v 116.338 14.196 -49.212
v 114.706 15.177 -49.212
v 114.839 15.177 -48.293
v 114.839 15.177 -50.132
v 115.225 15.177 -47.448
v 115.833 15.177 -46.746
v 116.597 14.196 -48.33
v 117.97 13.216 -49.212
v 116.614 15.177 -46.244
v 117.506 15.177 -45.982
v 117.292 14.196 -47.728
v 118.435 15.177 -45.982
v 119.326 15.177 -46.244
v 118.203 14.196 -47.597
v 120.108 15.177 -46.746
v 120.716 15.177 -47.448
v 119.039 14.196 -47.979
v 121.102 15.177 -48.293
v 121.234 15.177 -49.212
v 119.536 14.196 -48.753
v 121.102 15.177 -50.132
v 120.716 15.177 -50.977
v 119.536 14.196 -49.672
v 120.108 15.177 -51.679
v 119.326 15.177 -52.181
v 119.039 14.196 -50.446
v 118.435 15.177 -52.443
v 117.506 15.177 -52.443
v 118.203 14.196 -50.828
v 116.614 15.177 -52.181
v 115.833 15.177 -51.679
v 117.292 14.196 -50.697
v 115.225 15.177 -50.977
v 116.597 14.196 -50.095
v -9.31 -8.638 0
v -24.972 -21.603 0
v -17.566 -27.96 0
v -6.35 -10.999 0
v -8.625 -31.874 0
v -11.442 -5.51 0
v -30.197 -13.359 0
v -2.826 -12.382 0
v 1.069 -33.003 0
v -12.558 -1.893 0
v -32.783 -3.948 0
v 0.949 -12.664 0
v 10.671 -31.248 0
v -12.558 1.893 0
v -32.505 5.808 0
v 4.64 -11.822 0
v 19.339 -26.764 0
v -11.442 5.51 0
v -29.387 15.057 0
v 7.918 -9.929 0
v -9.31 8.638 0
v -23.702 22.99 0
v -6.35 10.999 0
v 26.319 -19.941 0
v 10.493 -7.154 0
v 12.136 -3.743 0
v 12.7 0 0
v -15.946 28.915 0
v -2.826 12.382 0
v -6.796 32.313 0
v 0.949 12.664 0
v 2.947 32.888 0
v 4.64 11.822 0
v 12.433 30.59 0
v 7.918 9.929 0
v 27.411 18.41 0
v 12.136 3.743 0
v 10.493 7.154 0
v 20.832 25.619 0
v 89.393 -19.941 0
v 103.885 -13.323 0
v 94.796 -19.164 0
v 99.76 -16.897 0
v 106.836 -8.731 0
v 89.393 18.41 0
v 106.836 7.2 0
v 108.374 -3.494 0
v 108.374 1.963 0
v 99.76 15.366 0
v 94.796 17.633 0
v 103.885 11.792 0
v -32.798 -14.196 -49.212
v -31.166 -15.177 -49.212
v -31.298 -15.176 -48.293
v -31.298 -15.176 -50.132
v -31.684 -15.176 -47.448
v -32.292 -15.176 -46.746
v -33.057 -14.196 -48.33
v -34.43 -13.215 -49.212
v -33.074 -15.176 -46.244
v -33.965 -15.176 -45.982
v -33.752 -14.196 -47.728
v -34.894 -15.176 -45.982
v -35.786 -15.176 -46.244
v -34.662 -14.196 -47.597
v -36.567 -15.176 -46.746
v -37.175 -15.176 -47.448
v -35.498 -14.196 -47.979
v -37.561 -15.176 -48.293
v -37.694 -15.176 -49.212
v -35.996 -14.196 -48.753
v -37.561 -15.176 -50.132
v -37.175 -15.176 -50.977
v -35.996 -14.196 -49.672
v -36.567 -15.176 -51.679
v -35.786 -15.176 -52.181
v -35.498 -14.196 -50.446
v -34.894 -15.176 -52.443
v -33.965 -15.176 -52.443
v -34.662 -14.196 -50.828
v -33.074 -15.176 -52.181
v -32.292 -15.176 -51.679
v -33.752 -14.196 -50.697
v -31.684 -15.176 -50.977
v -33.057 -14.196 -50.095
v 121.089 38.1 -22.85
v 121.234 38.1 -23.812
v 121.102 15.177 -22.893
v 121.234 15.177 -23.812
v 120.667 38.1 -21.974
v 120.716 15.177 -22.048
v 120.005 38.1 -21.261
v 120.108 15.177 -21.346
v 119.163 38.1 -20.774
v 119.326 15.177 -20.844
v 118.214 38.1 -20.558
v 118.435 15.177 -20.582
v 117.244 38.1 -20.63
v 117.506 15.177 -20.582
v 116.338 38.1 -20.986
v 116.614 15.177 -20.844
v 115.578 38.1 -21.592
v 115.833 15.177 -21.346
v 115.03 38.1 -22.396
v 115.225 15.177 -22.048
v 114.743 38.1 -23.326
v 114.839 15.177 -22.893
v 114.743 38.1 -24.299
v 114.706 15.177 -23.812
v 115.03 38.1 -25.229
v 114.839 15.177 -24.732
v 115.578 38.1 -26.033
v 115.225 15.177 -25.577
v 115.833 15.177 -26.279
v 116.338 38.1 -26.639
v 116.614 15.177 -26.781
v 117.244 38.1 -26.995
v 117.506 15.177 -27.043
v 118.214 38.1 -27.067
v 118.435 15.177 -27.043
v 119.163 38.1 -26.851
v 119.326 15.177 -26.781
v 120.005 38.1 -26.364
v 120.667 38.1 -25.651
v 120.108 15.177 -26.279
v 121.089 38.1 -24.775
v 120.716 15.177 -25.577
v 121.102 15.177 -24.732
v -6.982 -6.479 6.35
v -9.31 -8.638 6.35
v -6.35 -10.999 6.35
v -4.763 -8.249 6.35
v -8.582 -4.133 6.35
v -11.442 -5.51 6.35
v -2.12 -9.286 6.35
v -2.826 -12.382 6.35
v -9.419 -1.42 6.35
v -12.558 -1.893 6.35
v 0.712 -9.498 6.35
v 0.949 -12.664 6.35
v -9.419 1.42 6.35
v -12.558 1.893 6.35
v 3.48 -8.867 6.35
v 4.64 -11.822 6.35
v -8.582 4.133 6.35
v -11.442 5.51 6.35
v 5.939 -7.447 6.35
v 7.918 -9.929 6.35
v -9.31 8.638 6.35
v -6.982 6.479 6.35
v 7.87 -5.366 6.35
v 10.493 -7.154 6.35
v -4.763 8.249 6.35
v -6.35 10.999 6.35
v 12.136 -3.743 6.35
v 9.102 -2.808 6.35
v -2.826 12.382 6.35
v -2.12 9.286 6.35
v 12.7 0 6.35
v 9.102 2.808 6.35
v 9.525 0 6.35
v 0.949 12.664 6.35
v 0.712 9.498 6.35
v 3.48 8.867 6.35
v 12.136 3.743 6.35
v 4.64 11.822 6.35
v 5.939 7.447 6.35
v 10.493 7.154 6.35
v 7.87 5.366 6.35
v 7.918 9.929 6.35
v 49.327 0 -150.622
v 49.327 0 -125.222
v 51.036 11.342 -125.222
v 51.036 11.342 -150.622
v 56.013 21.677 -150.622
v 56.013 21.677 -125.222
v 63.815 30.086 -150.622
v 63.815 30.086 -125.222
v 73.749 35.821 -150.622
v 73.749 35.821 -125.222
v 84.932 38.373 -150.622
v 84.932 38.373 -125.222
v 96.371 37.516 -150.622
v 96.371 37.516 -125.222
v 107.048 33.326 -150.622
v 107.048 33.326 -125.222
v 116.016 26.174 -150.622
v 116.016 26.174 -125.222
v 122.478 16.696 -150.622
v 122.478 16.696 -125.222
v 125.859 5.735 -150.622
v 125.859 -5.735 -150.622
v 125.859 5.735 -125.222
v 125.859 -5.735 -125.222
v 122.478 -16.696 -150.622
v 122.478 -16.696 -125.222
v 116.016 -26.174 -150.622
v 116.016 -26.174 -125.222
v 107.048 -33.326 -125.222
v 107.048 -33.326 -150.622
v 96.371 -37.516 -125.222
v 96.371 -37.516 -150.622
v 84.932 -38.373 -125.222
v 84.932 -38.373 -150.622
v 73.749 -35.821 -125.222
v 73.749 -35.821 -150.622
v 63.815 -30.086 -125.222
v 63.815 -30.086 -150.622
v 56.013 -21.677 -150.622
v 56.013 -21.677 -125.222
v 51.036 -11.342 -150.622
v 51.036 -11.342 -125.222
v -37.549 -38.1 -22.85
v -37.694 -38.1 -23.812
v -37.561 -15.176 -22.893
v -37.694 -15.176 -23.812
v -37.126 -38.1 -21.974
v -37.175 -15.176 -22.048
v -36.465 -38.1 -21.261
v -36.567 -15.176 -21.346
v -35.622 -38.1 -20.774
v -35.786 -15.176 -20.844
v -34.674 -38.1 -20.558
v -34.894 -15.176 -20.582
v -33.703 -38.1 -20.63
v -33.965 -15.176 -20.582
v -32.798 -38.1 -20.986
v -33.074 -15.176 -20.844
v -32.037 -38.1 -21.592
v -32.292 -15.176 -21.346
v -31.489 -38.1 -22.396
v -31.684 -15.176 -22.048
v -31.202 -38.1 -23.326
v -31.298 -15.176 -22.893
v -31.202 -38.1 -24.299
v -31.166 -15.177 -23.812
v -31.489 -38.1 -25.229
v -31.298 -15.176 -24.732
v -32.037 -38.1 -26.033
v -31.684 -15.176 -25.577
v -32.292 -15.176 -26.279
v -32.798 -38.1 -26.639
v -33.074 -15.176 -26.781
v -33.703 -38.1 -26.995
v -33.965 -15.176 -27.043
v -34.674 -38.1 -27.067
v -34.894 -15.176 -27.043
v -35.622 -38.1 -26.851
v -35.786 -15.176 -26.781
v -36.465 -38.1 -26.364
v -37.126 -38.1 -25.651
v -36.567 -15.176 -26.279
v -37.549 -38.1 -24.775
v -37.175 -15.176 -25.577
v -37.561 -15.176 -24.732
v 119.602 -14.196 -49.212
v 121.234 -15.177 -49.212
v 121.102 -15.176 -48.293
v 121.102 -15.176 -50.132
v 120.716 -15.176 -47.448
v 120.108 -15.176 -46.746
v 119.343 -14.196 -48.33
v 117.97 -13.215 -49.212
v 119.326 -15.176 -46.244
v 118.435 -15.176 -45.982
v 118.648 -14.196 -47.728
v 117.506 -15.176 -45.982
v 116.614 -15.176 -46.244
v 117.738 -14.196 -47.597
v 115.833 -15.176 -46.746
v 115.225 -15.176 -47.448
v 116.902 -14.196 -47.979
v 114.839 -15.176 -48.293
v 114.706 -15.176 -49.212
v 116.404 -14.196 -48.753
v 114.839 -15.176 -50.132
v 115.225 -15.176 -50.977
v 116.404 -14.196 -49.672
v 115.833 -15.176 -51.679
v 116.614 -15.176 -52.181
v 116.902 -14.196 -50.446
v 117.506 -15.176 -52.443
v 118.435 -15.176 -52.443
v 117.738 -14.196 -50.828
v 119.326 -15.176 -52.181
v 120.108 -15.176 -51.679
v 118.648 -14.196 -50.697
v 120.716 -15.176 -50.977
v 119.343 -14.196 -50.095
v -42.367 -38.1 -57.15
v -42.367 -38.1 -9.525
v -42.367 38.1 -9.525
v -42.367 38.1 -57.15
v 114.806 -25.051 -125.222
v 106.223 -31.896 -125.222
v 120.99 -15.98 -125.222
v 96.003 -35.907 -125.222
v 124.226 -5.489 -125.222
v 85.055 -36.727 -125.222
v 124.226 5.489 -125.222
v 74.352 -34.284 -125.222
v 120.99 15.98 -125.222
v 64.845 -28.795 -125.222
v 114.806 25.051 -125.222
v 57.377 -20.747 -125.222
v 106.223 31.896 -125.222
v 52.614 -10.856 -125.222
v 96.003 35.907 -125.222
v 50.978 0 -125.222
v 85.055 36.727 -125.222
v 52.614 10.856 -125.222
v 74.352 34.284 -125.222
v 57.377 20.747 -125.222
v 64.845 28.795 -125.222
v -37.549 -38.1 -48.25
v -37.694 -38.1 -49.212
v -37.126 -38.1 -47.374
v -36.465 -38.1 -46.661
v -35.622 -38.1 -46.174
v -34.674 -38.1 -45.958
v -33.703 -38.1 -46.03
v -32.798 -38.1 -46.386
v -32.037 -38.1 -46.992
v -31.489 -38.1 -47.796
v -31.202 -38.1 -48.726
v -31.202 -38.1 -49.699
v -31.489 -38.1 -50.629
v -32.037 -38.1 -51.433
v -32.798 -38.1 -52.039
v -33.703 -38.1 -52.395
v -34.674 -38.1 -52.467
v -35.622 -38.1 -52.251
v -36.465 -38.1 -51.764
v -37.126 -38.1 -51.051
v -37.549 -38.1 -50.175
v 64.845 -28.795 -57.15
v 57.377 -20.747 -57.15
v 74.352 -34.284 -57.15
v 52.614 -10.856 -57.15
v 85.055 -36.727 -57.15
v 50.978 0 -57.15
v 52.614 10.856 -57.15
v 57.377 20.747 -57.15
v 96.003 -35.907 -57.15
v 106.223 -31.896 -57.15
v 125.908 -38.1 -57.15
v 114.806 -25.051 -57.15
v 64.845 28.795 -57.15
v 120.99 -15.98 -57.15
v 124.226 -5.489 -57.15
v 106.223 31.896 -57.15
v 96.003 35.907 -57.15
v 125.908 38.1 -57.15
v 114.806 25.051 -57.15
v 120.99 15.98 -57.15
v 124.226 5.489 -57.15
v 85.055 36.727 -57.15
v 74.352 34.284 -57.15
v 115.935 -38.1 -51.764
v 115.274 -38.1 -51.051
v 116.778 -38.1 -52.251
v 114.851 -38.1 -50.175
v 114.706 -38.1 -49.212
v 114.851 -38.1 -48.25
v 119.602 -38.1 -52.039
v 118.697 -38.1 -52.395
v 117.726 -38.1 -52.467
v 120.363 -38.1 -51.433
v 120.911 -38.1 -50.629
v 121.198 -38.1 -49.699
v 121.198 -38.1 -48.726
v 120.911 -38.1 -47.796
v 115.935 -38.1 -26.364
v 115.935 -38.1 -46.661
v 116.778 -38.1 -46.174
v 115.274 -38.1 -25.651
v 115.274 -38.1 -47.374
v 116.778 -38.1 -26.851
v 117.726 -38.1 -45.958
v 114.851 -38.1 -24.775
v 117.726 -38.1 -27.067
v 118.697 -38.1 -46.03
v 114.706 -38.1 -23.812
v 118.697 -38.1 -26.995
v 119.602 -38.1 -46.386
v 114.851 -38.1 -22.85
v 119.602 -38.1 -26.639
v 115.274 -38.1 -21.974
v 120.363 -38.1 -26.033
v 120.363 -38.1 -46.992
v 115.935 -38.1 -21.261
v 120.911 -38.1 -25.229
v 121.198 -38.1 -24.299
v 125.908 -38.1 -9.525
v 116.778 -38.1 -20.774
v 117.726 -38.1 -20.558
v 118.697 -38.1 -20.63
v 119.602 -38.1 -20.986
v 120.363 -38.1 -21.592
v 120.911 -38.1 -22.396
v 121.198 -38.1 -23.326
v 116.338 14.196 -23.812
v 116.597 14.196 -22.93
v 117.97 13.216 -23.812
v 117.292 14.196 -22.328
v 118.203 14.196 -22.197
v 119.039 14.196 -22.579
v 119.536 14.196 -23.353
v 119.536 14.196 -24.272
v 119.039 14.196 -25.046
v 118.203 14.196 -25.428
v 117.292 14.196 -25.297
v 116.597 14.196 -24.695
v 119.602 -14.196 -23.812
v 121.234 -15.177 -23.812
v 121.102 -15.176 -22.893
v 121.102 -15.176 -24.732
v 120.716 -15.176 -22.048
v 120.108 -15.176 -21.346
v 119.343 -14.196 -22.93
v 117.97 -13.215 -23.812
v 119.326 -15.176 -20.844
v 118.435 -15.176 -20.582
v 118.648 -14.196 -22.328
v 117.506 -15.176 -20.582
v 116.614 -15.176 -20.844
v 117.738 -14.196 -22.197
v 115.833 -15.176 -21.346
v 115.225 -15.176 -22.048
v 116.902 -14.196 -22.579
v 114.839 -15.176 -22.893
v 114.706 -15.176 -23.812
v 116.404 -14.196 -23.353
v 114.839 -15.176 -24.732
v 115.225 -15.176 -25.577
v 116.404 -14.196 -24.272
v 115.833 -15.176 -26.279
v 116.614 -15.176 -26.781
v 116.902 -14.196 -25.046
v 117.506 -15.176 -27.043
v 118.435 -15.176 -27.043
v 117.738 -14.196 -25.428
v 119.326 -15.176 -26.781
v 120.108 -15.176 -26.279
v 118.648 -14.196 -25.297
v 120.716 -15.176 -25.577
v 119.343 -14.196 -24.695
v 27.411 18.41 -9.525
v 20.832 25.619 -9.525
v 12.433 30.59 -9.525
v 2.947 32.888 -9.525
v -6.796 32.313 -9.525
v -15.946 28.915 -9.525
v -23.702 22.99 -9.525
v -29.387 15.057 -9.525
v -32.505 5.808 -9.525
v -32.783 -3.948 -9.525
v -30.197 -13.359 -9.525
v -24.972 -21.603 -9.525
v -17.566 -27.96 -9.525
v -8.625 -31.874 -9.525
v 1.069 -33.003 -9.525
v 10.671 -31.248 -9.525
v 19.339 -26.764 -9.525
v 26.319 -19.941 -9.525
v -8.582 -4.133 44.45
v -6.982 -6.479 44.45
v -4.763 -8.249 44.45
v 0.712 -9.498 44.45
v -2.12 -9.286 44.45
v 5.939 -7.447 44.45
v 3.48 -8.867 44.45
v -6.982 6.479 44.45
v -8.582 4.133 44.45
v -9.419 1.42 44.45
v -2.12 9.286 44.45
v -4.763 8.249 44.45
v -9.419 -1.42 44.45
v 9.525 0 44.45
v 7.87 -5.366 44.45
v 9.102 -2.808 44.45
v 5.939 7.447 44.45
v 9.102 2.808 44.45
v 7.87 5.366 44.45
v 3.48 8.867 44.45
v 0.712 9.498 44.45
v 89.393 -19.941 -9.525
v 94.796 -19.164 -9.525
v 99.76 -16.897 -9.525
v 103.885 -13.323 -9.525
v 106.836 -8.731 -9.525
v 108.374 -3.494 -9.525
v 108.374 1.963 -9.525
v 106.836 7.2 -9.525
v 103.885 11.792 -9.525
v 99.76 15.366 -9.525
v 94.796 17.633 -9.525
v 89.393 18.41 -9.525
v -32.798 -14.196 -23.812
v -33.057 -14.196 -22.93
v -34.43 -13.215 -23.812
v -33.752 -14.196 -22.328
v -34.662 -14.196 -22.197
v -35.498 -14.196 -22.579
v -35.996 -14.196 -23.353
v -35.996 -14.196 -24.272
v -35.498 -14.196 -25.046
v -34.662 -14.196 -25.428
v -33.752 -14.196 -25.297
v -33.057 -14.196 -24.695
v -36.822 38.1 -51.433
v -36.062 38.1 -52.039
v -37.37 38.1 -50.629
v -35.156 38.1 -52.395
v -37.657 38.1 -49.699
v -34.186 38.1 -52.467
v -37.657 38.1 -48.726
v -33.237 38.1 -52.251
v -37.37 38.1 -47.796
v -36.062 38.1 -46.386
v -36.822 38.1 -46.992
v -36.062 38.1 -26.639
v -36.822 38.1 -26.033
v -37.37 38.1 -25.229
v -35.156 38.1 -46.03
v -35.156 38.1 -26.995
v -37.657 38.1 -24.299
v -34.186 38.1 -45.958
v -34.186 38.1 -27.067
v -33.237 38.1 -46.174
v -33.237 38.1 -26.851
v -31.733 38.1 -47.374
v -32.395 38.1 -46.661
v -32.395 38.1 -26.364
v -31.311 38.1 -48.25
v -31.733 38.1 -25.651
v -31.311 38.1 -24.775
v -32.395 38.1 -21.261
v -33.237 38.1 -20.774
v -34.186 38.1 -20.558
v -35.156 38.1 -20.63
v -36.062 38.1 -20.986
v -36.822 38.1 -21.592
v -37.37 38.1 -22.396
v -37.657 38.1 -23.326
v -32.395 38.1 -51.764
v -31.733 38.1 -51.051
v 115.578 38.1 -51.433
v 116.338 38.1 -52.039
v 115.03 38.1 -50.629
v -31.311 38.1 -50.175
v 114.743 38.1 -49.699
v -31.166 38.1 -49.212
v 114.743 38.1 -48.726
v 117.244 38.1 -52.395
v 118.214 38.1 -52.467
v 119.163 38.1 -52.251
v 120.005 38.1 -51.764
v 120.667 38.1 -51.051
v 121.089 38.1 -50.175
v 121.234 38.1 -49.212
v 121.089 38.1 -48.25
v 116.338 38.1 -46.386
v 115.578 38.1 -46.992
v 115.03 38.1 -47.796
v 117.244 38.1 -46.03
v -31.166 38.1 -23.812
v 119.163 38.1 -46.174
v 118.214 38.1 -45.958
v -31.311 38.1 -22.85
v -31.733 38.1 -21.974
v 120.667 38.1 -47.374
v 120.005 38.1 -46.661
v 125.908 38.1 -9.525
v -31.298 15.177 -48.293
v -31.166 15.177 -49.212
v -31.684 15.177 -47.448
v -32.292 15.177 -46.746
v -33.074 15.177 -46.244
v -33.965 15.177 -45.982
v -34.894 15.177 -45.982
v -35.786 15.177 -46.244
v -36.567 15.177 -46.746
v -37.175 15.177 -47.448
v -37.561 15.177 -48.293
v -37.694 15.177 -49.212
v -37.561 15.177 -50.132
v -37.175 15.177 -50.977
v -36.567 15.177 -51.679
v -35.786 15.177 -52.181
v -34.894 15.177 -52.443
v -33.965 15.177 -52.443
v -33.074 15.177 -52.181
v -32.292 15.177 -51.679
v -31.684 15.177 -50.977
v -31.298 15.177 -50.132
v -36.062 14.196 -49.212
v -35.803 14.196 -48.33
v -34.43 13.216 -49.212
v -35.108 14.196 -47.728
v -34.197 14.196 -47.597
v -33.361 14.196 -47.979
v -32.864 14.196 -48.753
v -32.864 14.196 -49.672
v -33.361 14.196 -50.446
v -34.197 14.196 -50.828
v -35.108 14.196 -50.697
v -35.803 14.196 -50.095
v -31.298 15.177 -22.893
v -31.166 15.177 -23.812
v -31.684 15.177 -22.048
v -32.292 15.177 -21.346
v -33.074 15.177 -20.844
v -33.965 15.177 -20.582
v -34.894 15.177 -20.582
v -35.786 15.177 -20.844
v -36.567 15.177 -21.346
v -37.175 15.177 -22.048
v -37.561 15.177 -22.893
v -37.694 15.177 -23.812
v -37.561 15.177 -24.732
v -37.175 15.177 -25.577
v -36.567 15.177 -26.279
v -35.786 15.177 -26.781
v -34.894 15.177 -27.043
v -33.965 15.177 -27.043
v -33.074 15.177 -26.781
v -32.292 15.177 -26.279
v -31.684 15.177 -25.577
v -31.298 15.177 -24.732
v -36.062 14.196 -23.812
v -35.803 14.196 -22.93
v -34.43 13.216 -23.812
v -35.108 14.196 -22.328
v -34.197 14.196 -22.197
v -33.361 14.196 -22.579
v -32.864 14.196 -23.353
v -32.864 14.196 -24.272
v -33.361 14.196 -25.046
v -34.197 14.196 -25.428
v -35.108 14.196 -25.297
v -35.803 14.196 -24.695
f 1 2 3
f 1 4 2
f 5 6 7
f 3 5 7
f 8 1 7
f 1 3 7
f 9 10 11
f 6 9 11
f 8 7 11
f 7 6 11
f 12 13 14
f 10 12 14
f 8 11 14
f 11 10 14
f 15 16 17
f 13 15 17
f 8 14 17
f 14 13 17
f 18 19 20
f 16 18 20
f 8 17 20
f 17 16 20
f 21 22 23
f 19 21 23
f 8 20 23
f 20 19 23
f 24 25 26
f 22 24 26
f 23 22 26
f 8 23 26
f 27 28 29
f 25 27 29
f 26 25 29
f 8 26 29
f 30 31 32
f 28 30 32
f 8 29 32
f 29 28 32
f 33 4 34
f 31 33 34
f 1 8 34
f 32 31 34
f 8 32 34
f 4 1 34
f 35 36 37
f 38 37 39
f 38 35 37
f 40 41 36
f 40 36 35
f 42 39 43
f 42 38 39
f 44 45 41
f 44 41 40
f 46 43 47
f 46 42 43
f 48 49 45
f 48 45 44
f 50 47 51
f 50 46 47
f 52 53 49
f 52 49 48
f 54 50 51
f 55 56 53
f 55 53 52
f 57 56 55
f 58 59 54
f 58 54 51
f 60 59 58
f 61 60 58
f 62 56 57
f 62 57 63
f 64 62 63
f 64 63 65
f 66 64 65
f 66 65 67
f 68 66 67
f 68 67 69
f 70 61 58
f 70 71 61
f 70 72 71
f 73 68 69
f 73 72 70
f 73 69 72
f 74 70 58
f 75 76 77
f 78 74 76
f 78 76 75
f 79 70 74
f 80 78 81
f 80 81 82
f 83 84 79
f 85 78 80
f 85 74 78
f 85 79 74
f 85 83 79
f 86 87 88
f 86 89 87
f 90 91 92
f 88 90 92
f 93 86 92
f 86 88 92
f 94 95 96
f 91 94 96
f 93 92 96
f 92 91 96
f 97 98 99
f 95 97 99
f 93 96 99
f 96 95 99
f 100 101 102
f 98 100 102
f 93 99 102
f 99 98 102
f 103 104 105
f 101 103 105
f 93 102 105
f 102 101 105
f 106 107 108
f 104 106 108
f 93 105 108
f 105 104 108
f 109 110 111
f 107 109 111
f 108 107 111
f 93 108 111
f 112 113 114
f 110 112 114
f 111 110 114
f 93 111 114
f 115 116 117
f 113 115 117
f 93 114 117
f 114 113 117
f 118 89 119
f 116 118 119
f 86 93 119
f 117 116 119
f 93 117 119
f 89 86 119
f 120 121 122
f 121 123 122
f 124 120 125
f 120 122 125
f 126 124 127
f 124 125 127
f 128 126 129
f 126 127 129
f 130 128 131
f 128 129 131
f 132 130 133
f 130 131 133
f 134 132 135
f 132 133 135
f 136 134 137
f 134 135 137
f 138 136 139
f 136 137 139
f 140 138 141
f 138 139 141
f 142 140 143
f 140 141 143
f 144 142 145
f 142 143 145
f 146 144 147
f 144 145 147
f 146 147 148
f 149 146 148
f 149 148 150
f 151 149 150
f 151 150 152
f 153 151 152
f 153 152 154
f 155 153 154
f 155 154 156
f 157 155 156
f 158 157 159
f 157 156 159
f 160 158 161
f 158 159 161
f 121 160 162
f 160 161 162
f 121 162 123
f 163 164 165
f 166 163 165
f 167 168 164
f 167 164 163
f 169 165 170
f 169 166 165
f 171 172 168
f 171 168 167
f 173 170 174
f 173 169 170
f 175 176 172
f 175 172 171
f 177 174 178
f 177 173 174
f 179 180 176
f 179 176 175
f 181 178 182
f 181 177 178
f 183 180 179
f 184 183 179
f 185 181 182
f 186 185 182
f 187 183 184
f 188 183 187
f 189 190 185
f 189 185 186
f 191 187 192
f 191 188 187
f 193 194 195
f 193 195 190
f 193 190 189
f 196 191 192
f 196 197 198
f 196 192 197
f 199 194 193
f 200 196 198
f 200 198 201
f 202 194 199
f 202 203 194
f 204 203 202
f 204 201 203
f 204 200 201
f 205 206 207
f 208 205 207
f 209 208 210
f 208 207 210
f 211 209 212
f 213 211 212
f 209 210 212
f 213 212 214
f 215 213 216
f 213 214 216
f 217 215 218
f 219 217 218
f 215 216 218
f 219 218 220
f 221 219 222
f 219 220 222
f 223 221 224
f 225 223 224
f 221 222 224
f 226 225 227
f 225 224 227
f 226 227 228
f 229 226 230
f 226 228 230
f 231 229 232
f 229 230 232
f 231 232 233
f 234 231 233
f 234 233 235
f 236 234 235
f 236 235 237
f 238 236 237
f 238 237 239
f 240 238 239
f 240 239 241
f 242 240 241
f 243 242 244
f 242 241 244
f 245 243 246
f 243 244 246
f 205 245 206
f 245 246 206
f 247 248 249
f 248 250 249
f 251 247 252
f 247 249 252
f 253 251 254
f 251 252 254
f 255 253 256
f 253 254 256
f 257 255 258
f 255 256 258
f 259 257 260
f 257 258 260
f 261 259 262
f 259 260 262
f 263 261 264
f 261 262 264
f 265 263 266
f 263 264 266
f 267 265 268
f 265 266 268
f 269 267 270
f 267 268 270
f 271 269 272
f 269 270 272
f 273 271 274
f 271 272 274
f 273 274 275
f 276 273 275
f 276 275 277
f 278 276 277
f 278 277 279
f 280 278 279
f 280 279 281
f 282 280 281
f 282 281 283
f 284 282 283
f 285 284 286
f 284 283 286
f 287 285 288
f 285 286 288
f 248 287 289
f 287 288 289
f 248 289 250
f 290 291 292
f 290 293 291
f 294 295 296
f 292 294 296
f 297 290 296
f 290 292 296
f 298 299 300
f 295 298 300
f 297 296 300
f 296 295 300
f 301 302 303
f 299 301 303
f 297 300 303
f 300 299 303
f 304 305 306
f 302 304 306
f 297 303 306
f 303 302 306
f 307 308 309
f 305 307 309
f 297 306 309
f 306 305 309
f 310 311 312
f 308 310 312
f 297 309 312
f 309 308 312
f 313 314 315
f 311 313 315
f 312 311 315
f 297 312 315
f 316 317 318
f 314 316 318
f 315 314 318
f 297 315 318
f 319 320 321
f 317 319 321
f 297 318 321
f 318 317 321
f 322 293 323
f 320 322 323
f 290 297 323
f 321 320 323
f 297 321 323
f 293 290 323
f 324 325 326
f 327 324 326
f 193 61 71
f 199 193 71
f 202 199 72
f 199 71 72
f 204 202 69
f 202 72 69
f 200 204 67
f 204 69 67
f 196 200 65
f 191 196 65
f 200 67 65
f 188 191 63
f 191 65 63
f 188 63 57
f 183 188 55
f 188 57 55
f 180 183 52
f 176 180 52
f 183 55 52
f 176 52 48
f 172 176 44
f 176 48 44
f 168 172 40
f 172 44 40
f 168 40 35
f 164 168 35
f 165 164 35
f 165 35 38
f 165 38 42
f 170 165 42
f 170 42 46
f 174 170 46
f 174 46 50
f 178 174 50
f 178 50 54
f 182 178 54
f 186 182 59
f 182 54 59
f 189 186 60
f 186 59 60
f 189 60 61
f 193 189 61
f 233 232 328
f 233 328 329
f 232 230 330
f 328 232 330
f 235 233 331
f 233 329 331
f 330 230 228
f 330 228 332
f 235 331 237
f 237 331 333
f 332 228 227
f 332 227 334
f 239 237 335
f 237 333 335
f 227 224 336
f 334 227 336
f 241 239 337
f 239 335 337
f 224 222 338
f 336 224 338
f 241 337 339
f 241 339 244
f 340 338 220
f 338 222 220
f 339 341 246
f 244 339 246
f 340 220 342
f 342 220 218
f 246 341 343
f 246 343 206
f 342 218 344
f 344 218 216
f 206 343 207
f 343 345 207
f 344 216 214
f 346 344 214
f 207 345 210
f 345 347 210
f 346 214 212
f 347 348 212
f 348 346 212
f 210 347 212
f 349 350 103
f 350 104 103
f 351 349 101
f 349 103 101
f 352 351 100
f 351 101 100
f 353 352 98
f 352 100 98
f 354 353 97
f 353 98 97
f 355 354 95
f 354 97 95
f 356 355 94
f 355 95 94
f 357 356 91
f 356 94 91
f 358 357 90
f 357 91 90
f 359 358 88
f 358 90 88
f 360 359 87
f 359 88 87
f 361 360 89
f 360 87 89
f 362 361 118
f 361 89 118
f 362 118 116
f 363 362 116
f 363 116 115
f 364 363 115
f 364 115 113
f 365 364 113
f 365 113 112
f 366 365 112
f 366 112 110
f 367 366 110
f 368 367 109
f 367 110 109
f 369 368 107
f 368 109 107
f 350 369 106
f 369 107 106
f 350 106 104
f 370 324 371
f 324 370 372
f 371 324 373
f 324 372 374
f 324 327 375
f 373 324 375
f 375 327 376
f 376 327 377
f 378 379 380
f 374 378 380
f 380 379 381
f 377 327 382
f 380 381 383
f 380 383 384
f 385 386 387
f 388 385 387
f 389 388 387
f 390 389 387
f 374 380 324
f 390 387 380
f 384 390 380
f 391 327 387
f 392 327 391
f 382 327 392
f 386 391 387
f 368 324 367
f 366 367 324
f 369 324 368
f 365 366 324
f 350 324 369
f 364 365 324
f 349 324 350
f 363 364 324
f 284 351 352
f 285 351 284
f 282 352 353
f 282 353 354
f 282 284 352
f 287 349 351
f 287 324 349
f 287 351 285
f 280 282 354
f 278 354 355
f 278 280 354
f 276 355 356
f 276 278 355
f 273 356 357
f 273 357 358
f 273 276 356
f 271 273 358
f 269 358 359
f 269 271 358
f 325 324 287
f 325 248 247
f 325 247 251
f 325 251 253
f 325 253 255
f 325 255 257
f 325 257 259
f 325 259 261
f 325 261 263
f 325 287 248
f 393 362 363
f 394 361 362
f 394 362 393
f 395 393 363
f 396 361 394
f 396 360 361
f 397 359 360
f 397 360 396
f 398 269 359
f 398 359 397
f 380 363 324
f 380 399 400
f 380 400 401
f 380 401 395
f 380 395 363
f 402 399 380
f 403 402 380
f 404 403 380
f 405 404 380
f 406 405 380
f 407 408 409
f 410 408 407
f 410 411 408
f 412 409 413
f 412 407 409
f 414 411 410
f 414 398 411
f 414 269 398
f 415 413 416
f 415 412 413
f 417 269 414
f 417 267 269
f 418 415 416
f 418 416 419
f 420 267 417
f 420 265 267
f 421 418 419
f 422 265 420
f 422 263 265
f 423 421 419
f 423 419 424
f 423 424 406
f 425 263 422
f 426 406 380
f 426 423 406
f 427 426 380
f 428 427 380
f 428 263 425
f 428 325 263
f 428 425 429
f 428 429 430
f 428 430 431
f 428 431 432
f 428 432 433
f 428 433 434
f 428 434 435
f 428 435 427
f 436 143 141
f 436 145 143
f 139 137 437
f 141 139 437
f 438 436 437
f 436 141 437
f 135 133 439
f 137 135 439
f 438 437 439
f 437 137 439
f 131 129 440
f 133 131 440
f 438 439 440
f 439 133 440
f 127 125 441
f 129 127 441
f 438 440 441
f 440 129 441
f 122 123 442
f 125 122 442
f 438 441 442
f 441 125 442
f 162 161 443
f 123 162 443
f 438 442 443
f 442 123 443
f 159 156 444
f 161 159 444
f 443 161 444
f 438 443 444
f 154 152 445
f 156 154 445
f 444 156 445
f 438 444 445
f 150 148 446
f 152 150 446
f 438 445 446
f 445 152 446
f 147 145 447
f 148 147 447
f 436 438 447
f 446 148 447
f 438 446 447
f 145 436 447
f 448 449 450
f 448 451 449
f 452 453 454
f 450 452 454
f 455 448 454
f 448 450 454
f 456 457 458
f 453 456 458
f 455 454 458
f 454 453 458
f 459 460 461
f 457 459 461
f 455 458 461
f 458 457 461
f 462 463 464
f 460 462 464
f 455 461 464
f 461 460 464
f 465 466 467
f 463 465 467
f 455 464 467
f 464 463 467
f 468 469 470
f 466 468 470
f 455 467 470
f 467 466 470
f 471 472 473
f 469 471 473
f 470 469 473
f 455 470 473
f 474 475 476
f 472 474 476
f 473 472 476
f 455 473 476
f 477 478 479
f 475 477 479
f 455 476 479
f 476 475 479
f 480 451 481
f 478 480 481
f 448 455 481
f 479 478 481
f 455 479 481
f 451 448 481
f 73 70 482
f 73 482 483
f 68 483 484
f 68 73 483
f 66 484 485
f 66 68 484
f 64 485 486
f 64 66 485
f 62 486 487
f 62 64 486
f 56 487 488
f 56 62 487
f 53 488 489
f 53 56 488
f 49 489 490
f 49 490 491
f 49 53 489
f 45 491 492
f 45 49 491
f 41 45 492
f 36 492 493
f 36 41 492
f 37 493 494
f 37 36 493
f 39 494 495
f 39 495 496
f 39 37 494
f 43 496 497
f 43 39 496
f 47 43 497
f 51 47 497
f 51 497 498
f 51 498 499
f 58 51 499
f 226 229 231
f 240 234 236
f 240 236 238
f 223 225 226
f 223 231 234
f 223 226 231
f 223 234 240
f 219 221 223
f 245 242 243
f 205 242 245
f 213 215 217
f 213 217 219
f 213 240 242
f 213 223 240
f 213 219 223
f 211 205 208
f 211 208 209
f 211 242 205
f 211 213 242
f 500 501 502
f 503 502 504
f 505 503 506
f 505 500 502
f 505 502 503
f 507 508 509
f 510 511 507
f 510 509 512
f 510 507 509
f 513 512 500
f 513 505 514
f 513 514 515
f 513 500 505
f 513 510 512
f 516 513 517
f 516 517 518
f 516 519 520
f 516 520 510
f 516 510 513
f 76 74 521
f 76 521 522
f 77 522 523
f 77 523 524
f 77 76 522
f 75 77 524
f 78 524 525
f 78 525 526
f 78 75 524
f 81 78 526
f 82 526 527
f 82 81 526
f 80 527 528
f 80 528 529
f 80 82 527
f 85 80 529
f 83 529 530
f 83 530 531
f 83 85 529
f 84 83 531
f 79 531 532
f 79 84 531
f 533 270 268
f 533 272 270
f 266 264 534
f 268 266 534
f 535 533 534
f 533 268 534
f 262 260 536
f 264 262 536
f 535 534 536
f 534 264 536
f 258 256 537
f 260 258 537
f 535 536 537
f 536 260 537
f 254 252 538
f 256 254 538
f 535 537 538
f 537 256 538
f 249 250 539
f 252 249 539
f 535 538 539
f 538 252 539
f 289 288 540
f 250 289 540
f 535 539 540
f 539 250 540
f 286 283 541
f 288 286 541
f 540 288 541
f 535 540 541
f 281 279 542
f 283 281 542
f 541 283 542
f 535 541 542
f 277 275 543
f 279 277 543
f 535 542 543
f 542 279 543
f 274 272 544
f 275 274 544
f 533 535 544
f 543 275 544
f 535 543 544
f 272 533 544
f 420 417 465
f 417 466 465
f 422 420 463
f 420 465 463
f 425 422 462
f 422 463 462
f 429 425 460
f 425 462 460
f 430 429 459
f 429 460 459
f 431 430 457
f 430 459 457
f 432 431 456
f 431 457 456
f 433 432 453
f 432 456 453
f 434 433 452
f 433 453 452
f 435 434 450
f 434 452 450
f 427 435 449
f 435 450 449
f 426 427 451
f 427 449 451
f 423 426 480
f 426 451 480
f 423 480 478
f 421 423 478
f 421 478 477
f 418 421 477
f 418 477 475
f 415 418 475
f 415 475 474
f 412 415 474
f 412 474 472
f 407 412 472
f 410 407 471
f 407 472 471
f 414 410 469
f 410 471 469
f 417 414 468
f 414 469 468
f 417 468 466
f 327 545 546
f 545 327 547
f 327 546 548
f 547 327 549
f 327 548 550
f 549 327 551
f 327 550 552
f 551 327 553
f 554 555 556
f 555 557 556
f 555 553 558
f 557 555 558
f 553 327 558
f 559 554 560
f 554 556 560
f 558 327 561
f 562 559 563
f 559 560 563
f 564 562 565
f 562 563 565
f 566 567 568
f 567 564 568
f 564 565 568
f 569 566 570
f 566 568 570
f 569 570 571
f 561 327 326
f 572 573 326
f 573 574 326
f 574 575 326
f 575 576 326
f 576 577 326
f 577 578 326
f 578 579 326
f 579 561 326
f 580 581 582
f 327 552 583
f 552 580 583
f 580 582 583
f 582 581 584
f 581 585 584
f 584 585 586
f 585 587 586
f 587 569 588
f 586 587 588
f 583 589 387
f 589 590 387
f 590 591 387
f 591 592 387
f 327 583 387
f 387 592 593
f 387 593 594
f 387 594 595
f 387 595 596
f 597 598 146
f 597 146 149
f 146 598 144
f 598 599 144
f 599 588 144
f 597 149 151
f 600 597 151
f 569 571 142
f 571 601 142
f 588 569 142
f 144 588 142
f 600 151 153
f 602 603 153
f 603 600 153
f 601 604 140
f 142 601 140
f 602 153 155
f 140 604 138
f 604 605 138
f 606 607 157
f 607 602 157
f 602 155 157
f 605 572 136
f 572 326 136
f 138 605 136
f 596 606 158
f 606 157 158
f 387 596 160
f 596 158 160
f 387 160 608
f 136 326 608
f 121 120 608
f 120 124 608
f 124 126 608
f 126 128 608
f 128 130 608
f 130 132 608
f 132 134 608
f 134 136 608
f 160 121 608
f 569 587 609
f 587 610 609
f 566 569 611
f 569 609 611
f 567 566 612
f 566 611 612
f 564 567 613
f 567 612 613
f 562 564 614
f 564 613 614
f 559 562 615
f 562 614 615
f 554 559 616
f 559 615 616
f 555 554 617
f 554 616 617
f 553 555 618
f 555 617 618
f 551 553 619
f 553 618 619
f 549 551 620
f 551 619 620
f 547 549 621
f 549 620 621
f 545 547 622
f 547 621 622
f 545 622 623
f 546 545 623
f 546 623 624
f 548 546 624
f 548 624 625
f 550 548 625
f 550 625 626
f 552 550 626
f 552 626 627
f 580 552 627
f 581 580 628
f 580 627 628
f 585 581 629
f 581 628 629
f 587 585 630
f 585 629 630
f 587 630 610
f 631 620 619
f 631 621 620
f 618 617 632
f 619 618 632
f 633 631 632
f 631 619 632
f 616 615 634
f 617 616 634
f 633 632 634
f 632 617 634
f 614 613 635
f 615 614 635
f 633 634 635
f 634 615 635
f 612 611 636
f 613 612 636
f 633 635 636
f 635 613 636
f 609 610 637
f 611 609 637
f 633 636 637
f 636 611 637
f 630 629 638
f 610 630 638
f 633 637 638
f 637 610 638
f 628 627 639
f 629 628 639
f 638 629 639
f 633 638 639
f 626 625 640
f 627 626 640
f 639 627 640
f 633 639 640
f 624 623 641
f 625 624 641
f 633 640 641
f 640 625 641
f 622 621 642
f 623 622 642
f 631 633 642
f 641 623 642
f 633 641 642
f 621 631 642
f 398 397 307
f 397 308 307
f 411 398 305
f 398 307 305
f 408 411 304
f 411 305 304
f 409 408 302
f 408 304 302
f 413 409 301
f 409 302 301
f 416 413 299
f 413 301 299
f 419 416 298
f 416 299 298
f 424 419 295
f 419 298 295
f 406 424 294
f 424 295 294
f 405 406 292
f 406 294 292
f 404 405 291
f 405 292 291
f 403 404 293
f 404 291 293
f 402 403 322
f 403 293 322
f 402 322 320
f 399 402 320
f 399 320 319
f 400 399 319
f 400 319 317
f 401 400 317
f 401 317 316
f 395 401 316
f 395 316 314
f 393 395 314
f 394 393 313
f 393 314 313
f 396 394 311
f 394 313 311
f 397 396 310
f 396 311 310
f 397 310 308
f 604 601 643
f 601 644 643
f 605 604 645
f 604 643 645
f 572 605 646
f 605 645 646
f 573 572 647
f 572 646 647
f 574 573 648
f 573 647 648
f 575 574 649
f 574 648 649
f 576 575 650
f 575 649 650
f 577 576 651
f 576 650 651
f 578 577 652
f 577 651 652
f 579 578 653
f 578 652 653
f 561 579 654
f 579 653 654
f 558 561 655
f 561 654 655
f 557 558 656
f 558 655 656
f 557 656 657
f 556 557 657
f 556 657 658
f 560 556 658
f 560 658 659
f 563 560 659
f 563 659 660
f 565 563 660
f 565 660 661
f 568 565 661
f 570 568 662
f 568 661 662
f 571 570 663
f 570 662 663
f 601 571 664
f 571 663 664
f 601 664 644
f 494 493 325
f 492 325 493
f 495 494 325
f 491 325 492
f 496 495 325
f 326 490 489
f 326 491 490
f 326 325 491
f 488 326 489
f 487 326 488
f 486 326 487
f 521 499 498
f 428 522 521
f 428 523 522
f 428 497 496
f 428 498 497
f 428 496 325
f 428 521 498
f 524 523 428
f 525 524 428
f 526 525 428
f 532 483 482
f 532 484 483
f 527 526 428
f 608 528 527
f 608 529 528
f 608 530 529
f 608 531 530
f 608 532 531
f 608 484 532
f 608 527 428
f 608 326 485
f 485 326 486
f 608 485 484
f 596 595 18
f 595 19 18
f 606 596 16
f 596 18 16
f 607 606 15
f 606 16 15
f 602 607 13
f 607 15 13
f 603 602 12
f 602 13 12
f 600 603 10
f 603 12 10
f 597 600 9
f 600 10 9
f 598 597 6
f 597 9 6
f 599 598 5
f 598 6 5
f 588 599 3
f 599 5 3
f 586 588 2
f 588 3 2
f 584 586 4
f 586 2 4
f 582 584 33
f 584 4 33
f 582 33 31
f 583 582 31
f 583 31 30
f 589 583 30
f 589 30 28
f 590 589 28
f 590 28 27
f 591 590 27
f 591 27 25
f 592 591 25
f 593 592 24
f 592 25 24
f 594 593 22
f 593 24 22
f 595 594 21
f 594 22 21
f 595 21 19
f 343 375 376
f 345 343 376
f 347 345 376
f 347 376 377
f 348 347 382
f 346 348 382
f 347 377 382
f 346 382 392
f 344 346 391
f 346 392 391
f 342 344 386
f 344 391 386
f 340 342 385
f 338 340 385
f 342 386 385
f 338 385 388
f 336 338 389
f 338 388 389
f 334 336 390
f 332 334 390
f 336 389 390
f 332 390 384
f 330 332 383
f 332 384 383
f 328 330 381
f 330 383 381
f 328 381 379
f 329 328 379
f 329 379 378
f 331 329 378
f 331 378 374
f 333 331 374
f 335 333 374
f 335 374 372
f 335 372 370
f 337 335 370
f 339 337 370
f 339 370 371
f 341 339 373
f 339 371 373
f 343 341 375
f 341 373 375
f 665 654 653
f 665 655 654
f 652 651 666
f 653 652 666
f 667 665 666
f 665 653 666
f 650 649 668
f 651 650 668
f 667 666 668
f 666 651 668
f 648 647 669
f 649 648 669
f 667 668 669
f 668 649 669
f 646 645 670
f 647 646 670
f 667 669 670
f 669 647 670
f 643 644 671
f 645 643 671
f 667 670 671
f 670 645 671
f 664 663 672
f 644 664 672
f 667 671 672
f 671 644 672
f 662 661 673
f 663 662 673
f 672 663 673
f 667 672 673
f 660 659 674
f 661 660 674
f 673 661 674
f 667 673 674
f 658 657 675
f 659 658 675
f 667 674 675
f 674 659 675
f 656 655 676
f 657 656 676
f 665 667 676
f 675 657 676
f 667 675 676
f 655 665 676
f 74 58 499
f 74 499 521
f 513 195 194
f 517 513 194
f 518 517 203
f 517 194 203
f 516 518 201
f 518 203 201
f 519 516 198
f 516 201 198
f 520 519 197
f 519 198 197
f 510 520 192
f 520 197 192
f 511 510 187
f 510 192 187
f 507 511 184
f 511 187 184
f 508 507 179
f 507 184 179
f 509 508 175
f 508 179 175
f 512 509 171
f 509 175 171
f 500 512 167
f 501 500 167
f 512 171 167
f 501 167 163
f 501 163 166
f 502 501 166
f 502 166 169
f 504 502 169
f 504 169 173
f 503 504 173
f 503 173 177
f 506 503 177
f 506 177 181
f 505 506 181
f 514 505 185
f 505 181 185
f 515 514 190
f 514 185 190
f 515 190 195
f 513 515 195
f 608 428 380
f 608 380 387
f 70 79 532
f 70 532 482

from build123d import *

# Parameters (mm, degrees)
SKETCH1_W                    = 168.275
SKETCH1_H                    = 76.2
EXTRUDE1_DEPTH               = 57.15
SKETCH2_R                    = 12.7
EXTRUDE2_DEPTH               = 6.35
SKETCH3_R                    = 9.525
EXTRUDE3_DEPTH               = 38.1
F_5_16_18_TAPPED_HOLE1_D     = 6.5278
F_5_16_18_TAPPED_HOLE1_DEPTH = 22.9235
F_5_16_18_TAPPED_HOLE1_TIP   = 1.961148974
SKETCH7_R                    = 36.83
EXTRUDE4_DEPTH               = 68.072
SKETCH8_R                    = 38.481
EXTRUDE5_DEPTH               = 25.4
F_5_16_18_TAPPED_HOLE2_D     = 6.5278
F_5_16_18_TAPPED_HOLE2_DEPTH = 22.922992
F_5_16_18_TAPPED_HOLE2_TIP   = 1.961148974
SKETCH11_OUTSIDE_W           = 224.478
SKETCH11_OUTSIDE_H           = 132.784
CUT_EXTRUDE1_DEPTH           = 9.525


with BuildPart() as part:
    # Sketch1 → Extrude1 (new body)
    with BuildSketch(Plane.XY):
        with Locations((41.7703, 0)):
            Rectangle(SKETCH1_W, SKETCH1_H)
    extrude(amount=-EXTRUDE1_DEPTH)

    # Sketch2 → Extrude2 (add)
    with BuildSketch(Plane.XY):
        Circle(SKETCH2_R)
    extrude(amount=EXTRUDE2_DEPTH)

    # Sketch3 → Extrude3 (add)
    with BuildSketch(Plane.XY.offset(6.35)):
        Circle(SKETCH3_R)
    extrude(amount=EXTRUDE3_DEPTH)

    # 5/16-18 Tapped Hole1
    with Locations(Plane.XZ.offset(38.1)):
        with Locations((-34.4297, -23.8125), (-34.4297, -49.2125), (117.9703, -49.2125), (117.9703, -23.8125)):
            Hole(F_5_16_18_TAPPED_HOLE1_D / 2, depth=F_5_16_18_TAPPED_HOLE1_DEPTH)
            with Locations((0, 0, -(F_5_16_18_TAPPED_HOLE1_DEPTH + F_5_16_18_TAPPED_HOLE1_TIP / 2))):  # 118° drill point
                Cone(0, F_5_16_18_TAPPED_HOLE1_D / 2, F_5_16_18_TAPPED_HOLE1_TIP, mode=Mode.SUBTRACT)

    # Sketch7 → Extrude4 (add)
    with BuildSketch(Plane(origin=(0, 0, -57.15), x_dir=(-1, 0, 0), z_dir=(0, 0, -1))):
        with Locations((-87.8078, 0)):
            Circle(SKETCH7_R)
    extrude(amount=EXTRUDE4_DEPTH)

    # Sketch8 → Extrude5 (add)
    with BuildSketch(Plane(origin=(0, 0, -125.222), x_dir=(-1, 0, 0), z_dir=(0, 0, -1))):
        with Locations((-87.8078, 0)):
            Circle(SKETCH8_R)
    extrude(amount=EXTRUDE5_DEPTH)

    # 5/16-18 Tapped Hole2
    with Locations(Plane(origin=(0, 38.1, 0), x_dir=(-1, 0, 0), z_dir=(0, 1, 0))):
        with Locations((34.4297, -23.8125), (34.4297, -49.2125), (-117.9703, -49.2125), (-117.9703, -23.8125)):
            Hole(F_5_16_18_TAPPED_HOLE2_D / 2, depth=F_5_16_18_TAPPED_HOLE2_DEPTH)
            with Locations((0, 0, -(F_5_16_18_TAPPED_HOLE2_DEPTH + F_5_16_18_TAPPED_HOLE2_TIP / 2))):  # 118° drill point
                Cone(0, F_5_16_18_TAPPED_HOLE2_D / 2, F_5_16_18_TAPPED_HOLE2_TIP, mode=Mode.SUBTRACT)

    # Sketch11 outside → Cut-Extrude1 (cut)
    with BuildSketch(Plane.XY):
        with Locations((41.961, 0)):
            Rectangle(SKETCH11_OUTSIDE_W, SKETCH11_OUTSIDE_H)
        with BuildLine():
            Line((89.393090644, 18.410189037), (27.411408932, 18.410189037))
            ThreePointArc((27.411408932, 18.410189037), (-33.006603821, 0.940480831), (26.318636507, -19.941157749))
            Line((26.318636507, -19.941157749), (89.393090644, -19.941157749))
            ThreePointArc((89.393090644, -19.941157749), (108.568764037, -0.765484356), (89.393090644, 18.410189037))
        make_face(mode=Mode.SUBTRACT)
    extrude(amount=-CUT_EXTRUDE1_DEPTH, mode=Mode.SUBTRACT)


solid = part.part
